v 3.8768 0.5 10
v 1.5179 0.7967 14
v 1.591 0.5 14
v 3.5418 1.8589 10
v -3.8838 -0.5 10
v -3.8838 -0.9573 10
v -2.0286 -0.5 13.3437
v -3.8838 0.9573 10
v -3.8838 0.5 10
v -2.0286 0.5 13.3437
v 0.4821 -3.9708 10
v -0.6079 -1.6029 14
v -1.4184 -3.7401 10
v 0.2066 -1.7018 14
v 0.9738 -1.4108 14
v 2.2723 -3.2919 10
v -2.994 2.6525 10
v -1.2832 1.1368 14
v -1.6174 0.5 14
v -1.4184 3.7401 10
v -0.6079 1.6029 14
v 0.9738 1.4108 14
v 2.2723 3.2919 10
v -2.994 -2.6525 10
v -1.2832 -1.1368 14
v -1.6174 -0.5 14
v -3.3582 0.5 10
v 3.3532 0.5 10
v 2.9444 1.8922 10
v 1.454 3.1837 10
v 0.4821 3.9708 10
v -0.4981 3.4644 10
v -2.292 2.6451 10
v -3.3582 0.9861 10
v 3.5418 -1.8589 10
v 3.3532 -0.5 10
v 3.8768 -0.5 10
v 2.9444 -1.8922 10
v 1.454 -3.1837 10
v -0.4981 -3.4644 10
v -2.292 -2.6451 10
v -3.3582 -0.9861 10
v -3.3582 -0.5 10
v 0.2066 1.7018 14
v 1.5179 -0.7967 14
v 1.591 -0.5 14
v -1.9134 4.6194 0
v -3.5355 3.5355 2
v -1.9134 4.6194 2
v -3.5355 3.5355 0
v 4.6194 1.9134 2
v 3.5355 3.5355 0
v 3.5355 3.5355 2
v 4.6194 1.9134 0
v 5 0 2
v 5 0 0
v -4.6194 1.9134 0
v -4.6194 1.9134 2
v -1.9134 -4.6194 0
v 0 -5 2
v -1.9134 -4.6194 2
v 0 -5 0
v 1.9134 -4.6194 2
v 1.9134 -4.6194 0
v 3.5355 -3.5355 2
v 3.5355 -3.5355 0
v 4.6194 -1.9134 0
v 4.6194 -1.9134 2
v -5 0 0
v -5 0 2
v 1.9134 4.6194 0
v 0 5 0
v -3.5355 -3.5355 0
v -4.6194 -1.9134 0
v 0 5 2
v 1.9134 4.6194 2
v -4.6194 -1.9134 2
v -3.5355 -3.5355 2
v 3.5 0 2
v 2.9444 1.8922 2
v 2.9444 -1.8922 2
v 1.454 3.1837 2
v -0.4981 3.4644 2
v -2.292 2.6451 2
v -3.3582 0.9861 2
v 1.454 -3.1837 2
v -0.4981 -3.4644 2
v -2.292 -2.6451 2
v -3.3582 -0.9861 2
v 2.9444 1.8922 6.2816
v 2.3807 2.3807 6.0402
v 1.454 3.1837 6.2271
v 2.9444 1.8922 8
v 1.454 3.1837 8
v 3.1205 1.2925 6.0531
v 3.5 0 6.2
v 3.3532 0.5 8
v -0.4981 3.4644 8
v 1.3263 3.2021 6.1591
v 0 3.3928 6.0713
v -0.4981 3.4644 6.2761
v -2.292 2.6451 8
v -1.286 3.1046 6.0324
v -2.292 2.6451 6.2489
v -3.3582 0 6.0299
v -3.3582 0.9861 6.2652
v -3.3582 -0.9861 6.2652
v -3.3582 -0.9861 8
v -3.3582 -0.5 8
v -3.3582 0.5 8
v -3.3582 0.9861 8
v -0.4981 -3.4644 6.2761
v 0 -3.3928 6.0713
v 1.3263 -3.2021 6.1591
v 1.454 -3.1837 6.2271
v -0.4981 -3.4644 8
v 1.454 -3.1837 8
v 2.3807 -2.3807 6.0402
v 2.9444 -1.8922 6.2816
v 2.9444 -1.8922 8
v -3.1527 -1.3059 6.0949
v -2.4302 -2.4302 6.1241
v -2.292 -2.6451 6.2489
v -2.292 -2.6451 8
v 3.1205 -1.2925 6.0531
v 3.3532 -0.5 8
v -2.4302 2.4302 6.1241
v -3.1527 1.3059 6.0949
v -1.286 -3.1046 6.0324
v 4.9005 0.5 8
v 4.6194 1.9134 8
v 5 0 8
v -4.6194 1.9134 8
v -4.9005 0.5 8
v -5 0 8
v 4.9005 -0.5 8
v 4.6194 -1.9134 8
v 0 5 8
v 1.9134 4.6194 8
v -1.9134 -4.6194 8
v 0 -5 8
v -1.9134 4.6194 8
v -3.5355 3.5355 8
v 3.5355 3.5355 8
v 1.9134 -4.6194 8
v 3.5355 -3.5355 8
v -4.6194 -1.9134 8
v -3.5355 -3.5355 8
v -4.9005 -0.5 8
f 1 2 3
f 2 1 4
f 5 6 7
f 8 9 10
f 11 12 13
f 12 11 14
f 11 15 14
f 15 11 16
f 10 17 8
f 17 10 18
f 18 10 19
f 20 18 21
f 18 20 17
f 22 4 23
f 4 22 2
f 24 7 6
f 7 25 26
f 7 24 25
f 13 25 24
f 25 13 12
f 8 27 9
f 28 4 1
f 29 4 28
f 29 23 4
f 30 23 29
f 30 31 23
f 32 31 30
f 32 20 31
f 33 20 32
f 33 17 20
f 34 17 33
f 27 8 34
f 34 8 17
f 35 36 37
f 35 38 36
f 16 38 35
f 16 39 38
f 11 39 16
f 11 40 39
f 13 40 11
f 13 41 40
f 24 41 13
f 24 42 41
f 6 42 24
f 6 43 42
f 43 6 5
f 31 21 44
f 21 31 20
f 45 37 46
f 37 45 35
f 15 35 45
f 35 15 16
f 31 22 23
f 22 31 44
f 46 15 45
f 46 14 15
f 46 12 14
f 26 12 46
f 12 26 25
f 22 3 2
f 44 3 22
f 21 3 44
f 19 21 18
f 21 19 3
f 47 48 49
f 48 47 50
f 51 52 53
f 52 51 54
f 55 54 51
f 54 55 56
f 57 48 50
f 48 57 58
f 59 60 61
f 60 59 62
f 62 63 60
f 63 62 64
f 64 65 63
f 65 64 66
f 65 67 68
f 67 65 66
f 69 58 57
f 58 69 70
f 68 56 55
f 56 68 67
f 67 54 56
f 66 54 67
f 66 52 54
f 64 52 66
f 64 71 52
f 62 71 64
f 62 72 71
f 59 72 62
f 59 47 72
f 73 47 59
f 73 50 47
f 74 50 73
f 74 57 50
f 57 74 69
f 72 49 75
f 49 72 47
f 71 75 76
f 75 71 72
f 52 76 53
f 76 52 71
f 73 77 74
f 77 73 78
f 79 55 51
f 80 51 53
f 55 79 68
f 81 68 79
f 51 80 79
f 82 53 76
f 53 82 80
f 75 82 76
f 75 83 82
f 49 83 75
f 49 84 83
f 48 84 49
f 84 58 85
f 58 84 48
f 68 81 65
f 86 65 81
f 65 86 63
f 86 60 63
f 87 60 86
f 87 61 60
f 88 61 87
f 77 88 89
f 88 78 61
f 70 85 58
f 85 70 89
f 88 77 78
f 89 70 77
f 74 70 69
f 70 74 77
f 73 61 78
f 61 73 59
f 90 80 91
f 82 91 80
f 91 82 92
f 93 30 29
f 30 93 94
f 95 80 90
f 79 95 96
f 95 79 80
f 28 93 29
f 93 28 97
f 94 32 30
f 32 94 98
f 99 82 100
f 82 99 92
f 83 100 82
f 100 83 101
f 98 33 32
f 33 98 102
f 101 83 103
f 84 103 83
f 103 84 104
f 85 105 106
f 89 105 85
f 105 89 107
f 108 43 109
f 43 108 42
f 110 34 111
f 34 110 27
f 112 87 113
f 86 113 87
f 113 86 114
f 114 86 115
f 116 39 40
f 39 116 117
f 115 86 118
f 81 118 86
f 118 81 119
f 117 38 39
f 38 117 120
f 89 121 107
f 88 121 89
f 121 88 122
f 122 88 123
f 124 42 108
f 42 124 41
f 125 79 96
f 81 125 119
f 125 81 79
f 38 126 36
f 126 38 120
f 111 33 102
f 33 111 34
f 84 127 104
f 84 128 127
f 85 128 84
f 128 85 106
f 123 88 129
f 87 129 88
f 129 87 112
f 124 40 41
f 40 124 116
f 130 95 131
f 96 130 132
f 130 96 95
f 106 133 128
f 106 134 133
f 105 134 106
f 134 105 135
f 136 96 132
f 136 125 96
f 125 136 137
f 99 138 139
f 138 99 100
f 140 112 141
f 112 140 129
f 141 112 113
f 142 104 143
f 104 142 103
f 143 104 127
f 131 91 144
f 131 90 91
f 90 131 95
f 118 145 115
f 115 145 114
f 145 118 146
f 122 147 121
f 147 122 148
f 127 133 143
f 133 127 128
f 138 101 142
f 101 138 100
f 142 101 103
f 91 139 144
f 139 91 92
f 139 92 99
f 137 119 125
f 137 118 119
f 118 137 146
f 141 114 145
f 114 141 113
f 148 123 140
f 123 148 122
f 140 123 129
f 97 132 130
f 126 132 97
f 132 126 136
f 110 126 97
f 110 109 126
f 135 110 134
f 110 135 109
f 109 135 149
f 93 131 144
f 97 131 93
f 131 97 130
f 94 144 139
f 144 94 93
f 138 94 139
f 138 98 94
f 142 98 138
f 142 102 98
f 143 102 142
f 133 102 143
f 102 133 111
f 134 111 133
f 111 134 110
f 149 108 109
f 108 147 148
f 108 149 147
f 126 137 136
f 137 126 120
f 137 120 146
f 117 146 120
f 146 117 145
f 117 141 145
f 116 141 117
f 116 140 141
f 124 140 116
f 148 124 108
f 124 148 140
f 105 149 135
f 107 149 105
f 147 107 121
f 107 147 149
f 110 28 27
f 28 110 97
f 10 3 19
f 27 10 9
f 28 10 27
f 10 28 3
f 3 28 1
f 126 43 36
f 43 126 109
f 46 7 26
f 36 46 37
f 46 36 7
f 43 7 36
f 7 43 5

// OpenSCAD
//6.5mm hole

module thingy() {
 
    //string holder
cylinder(r=5, h=2); 
 //center pin      
    translate([0,0,2]) cylinder(r=3.5, h=8);

 //stop
translate([0,0,2]) cylinder(r=0, r2=5, h=6);

// point (blunted)
translate([0,0,10]) {
    difference() {
    cylinder(r1=4, r2=0, h=7);
        translate([0,0,8]) cube([8,8,8], center=true);
    }
}
}

module slot(){
    translate([0,0,11]) cube([20, 1, 6], center=true);
}

difference(){ 
    thingy();
    slot(); 
}
